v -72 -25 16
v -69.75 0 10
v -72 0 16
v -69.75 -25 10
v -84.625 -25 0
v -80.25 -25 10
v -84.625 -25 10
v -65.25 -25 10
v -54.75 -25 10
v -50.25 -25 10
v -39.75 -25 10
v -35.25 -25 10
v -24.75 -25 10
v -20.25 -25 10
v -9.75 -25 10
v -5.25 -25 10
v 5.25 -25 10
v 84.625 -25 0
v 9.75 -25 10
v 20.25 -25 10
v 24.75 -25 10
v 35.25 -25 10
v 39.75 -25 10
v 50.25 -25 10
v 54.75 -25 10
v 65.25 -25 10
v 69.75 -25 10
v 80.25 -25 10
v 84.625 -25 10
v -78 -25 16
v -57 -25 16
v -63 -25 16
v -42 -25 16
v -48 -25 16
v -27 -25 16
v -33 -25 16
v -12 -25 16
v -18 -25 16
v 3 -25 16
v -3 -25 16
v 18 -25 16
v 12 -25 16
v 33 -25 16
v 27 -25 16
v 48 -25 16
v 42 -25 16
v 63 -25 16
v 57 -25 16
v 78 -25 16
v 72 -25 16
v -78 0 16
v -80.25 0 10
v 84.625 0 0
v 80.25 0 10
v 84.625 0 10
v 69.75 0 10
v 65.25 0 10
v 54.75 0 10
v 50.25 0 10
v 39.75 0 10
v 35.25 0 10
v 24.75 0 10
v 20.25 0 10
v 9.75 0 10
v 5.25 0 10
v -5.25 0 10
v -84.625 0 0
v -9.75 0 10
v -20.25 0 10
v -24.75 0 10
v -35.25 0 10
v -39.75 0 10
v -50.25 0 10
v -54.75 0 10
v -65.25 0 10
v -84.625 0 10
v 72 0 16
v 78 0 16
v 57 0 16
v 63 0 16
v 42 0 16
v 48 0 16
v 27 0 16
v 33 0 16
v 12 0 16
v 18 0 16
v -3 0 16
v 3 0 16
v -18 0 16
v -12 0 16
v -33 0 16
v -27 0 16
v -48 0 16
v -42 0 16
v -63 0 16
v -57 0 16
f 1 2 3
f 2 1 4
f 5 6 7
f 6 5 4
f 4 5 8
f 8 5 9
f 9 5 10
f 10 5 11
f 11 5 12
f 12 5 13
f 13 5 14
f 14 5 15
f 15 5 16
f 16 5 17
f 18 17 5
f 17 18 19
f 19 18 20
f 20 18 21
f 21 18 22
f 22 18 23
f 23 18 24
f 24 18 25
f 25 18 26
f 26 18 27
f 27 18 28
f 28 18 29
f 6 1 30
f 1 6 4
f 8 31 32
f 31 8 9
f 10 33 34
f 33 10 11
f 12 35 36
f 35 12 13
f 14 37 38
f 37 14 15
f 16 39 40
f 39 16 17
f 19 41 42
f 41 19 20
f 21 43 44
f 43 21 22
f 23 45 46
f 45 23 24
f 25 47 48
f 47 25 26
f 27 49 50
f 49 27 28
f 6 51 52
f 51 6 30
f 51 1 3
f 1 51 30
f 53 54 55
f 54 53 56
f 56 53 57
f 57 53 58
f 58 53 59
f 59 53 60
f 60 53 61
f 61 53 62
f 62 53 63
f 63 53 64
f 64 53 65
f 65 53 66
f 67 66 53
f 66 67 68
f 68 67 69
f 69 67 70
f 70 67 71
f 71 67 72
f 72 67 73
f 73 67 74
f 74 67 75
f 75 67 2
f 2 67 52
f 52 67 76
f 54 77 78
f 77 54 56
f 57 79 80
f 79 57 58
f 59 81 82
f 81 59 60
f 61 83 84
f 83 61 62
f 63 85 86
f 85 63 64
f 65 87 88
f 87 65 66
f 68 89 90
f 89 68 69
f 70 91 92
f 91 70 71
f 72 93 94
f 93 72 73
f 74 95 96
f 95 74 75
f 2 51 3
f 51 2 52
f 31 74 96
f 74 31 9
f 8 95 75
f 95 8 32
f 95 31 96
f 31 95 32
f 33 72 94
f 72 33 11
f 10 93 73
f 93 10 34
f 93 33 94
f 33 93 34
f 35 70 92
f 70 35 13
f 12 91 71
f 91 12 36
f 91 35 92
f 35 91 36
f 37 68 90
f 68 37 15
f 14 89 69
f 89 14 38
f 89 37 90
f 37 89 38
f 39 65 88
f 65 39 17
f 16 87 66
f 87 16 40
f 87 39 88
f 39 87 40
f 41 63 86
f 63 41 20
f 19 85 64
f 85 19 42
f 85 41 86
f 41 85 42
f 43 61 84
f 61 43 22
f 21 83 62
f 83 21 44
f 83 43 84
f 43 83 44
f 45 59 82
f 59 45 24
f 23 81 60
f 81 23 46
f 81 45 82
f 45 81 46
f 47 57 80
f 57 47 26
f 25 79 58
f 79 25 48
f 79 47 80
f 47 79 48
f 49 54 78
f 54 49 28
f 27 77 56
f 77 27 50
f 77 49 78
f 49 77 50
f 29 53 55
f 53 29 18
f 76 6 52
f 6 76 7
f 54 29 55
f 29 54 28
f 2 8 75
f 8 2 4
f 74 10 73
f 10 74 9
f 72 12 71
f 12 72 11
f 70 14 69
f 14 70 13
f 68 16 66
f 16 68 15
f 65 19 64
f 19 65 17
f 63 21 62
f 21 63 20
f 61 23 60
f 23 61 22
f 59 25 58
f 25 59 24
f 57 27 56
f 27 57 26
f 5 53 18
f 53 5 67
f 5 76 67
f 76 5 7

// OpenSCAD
$fn = 32;

// ----------------------------------------------------------------------
// Toothed rack, 11 teeth
// 15 mm pitch, 6 mm teeth
// ----------------------------------------------------------------------

// --- parameters (mm) ---
bar_w = 25;      // bar width (Y)
bar_h = 10;      // bar height (Z)
teeth = 11;      // number of teeth
pitch = 15;      // tooth pitch
tooth_h = 6;     // tooth height above the bar
root_w = 11.25;  // tooth width at the root
crest_w = 6;     // tooth width at the crest

// --- derived feature positions (mm) ---
span = (teeth - 1) * pitch;  // = 150   distance between the outer teeth
bar_l = span + root_w + 8;   // = 169.25   bar length: teeth plus 4 mm at each end
tooth_x = -span / 2;         // = -75   X of the first tooth
height = bar_h + tooth_h;    // = 16   overall height
feature_centers = [
  [tooth_x + 0 * pitch, -bar_w / 2],
  [tooth_x + 1 * pitch, -bar_w / 2],
  [tooth_x + 2 * pitch, -bar_w / 2],
  [tooth_x + 3 * pitch, -bar_w / 2],
  [tooth_x + 4 * pitch, -bar_w / 2],
  [tooth_x + 5 * pitch, -bar_w / 2],
  [tooth_x + 6 * pitch, -bar_w / 2],
  [tooth_x + 7 * pitch, -bar_w / 2],
  [tooth_x + 8 * pitch, -bar_w / 2],
  [tooth_x + 9 * pitch, -bar_w / 2],
  [tooth_x + 10 * pitch, -bar_w / 2]
];   // tooth centre line, drives the tooth loop

// bar with a rack of teeth, one extruded trapezoium per centre
module rack_tooth() {
  linear_extrude(height = bar_w)
    polygon(points = [
      [0, 0],
      [root_w, 0],
      [root_w / 2 + crest_w / 2, tooth_h + 1],
      [root_w / 2 - crest_w / 2, tooth_h + 1]
    ]);
}

union() {
  translate([-bar_l / 2, -bar_w, 0]) cube([bar_l, bar_w, bar_h]);
  for (centre = feature_centers)
    translate([centre[0] - root_w / 2, 0, bar_h - 1]) rotate([90, 0, 0]) rack_tooth();
}
